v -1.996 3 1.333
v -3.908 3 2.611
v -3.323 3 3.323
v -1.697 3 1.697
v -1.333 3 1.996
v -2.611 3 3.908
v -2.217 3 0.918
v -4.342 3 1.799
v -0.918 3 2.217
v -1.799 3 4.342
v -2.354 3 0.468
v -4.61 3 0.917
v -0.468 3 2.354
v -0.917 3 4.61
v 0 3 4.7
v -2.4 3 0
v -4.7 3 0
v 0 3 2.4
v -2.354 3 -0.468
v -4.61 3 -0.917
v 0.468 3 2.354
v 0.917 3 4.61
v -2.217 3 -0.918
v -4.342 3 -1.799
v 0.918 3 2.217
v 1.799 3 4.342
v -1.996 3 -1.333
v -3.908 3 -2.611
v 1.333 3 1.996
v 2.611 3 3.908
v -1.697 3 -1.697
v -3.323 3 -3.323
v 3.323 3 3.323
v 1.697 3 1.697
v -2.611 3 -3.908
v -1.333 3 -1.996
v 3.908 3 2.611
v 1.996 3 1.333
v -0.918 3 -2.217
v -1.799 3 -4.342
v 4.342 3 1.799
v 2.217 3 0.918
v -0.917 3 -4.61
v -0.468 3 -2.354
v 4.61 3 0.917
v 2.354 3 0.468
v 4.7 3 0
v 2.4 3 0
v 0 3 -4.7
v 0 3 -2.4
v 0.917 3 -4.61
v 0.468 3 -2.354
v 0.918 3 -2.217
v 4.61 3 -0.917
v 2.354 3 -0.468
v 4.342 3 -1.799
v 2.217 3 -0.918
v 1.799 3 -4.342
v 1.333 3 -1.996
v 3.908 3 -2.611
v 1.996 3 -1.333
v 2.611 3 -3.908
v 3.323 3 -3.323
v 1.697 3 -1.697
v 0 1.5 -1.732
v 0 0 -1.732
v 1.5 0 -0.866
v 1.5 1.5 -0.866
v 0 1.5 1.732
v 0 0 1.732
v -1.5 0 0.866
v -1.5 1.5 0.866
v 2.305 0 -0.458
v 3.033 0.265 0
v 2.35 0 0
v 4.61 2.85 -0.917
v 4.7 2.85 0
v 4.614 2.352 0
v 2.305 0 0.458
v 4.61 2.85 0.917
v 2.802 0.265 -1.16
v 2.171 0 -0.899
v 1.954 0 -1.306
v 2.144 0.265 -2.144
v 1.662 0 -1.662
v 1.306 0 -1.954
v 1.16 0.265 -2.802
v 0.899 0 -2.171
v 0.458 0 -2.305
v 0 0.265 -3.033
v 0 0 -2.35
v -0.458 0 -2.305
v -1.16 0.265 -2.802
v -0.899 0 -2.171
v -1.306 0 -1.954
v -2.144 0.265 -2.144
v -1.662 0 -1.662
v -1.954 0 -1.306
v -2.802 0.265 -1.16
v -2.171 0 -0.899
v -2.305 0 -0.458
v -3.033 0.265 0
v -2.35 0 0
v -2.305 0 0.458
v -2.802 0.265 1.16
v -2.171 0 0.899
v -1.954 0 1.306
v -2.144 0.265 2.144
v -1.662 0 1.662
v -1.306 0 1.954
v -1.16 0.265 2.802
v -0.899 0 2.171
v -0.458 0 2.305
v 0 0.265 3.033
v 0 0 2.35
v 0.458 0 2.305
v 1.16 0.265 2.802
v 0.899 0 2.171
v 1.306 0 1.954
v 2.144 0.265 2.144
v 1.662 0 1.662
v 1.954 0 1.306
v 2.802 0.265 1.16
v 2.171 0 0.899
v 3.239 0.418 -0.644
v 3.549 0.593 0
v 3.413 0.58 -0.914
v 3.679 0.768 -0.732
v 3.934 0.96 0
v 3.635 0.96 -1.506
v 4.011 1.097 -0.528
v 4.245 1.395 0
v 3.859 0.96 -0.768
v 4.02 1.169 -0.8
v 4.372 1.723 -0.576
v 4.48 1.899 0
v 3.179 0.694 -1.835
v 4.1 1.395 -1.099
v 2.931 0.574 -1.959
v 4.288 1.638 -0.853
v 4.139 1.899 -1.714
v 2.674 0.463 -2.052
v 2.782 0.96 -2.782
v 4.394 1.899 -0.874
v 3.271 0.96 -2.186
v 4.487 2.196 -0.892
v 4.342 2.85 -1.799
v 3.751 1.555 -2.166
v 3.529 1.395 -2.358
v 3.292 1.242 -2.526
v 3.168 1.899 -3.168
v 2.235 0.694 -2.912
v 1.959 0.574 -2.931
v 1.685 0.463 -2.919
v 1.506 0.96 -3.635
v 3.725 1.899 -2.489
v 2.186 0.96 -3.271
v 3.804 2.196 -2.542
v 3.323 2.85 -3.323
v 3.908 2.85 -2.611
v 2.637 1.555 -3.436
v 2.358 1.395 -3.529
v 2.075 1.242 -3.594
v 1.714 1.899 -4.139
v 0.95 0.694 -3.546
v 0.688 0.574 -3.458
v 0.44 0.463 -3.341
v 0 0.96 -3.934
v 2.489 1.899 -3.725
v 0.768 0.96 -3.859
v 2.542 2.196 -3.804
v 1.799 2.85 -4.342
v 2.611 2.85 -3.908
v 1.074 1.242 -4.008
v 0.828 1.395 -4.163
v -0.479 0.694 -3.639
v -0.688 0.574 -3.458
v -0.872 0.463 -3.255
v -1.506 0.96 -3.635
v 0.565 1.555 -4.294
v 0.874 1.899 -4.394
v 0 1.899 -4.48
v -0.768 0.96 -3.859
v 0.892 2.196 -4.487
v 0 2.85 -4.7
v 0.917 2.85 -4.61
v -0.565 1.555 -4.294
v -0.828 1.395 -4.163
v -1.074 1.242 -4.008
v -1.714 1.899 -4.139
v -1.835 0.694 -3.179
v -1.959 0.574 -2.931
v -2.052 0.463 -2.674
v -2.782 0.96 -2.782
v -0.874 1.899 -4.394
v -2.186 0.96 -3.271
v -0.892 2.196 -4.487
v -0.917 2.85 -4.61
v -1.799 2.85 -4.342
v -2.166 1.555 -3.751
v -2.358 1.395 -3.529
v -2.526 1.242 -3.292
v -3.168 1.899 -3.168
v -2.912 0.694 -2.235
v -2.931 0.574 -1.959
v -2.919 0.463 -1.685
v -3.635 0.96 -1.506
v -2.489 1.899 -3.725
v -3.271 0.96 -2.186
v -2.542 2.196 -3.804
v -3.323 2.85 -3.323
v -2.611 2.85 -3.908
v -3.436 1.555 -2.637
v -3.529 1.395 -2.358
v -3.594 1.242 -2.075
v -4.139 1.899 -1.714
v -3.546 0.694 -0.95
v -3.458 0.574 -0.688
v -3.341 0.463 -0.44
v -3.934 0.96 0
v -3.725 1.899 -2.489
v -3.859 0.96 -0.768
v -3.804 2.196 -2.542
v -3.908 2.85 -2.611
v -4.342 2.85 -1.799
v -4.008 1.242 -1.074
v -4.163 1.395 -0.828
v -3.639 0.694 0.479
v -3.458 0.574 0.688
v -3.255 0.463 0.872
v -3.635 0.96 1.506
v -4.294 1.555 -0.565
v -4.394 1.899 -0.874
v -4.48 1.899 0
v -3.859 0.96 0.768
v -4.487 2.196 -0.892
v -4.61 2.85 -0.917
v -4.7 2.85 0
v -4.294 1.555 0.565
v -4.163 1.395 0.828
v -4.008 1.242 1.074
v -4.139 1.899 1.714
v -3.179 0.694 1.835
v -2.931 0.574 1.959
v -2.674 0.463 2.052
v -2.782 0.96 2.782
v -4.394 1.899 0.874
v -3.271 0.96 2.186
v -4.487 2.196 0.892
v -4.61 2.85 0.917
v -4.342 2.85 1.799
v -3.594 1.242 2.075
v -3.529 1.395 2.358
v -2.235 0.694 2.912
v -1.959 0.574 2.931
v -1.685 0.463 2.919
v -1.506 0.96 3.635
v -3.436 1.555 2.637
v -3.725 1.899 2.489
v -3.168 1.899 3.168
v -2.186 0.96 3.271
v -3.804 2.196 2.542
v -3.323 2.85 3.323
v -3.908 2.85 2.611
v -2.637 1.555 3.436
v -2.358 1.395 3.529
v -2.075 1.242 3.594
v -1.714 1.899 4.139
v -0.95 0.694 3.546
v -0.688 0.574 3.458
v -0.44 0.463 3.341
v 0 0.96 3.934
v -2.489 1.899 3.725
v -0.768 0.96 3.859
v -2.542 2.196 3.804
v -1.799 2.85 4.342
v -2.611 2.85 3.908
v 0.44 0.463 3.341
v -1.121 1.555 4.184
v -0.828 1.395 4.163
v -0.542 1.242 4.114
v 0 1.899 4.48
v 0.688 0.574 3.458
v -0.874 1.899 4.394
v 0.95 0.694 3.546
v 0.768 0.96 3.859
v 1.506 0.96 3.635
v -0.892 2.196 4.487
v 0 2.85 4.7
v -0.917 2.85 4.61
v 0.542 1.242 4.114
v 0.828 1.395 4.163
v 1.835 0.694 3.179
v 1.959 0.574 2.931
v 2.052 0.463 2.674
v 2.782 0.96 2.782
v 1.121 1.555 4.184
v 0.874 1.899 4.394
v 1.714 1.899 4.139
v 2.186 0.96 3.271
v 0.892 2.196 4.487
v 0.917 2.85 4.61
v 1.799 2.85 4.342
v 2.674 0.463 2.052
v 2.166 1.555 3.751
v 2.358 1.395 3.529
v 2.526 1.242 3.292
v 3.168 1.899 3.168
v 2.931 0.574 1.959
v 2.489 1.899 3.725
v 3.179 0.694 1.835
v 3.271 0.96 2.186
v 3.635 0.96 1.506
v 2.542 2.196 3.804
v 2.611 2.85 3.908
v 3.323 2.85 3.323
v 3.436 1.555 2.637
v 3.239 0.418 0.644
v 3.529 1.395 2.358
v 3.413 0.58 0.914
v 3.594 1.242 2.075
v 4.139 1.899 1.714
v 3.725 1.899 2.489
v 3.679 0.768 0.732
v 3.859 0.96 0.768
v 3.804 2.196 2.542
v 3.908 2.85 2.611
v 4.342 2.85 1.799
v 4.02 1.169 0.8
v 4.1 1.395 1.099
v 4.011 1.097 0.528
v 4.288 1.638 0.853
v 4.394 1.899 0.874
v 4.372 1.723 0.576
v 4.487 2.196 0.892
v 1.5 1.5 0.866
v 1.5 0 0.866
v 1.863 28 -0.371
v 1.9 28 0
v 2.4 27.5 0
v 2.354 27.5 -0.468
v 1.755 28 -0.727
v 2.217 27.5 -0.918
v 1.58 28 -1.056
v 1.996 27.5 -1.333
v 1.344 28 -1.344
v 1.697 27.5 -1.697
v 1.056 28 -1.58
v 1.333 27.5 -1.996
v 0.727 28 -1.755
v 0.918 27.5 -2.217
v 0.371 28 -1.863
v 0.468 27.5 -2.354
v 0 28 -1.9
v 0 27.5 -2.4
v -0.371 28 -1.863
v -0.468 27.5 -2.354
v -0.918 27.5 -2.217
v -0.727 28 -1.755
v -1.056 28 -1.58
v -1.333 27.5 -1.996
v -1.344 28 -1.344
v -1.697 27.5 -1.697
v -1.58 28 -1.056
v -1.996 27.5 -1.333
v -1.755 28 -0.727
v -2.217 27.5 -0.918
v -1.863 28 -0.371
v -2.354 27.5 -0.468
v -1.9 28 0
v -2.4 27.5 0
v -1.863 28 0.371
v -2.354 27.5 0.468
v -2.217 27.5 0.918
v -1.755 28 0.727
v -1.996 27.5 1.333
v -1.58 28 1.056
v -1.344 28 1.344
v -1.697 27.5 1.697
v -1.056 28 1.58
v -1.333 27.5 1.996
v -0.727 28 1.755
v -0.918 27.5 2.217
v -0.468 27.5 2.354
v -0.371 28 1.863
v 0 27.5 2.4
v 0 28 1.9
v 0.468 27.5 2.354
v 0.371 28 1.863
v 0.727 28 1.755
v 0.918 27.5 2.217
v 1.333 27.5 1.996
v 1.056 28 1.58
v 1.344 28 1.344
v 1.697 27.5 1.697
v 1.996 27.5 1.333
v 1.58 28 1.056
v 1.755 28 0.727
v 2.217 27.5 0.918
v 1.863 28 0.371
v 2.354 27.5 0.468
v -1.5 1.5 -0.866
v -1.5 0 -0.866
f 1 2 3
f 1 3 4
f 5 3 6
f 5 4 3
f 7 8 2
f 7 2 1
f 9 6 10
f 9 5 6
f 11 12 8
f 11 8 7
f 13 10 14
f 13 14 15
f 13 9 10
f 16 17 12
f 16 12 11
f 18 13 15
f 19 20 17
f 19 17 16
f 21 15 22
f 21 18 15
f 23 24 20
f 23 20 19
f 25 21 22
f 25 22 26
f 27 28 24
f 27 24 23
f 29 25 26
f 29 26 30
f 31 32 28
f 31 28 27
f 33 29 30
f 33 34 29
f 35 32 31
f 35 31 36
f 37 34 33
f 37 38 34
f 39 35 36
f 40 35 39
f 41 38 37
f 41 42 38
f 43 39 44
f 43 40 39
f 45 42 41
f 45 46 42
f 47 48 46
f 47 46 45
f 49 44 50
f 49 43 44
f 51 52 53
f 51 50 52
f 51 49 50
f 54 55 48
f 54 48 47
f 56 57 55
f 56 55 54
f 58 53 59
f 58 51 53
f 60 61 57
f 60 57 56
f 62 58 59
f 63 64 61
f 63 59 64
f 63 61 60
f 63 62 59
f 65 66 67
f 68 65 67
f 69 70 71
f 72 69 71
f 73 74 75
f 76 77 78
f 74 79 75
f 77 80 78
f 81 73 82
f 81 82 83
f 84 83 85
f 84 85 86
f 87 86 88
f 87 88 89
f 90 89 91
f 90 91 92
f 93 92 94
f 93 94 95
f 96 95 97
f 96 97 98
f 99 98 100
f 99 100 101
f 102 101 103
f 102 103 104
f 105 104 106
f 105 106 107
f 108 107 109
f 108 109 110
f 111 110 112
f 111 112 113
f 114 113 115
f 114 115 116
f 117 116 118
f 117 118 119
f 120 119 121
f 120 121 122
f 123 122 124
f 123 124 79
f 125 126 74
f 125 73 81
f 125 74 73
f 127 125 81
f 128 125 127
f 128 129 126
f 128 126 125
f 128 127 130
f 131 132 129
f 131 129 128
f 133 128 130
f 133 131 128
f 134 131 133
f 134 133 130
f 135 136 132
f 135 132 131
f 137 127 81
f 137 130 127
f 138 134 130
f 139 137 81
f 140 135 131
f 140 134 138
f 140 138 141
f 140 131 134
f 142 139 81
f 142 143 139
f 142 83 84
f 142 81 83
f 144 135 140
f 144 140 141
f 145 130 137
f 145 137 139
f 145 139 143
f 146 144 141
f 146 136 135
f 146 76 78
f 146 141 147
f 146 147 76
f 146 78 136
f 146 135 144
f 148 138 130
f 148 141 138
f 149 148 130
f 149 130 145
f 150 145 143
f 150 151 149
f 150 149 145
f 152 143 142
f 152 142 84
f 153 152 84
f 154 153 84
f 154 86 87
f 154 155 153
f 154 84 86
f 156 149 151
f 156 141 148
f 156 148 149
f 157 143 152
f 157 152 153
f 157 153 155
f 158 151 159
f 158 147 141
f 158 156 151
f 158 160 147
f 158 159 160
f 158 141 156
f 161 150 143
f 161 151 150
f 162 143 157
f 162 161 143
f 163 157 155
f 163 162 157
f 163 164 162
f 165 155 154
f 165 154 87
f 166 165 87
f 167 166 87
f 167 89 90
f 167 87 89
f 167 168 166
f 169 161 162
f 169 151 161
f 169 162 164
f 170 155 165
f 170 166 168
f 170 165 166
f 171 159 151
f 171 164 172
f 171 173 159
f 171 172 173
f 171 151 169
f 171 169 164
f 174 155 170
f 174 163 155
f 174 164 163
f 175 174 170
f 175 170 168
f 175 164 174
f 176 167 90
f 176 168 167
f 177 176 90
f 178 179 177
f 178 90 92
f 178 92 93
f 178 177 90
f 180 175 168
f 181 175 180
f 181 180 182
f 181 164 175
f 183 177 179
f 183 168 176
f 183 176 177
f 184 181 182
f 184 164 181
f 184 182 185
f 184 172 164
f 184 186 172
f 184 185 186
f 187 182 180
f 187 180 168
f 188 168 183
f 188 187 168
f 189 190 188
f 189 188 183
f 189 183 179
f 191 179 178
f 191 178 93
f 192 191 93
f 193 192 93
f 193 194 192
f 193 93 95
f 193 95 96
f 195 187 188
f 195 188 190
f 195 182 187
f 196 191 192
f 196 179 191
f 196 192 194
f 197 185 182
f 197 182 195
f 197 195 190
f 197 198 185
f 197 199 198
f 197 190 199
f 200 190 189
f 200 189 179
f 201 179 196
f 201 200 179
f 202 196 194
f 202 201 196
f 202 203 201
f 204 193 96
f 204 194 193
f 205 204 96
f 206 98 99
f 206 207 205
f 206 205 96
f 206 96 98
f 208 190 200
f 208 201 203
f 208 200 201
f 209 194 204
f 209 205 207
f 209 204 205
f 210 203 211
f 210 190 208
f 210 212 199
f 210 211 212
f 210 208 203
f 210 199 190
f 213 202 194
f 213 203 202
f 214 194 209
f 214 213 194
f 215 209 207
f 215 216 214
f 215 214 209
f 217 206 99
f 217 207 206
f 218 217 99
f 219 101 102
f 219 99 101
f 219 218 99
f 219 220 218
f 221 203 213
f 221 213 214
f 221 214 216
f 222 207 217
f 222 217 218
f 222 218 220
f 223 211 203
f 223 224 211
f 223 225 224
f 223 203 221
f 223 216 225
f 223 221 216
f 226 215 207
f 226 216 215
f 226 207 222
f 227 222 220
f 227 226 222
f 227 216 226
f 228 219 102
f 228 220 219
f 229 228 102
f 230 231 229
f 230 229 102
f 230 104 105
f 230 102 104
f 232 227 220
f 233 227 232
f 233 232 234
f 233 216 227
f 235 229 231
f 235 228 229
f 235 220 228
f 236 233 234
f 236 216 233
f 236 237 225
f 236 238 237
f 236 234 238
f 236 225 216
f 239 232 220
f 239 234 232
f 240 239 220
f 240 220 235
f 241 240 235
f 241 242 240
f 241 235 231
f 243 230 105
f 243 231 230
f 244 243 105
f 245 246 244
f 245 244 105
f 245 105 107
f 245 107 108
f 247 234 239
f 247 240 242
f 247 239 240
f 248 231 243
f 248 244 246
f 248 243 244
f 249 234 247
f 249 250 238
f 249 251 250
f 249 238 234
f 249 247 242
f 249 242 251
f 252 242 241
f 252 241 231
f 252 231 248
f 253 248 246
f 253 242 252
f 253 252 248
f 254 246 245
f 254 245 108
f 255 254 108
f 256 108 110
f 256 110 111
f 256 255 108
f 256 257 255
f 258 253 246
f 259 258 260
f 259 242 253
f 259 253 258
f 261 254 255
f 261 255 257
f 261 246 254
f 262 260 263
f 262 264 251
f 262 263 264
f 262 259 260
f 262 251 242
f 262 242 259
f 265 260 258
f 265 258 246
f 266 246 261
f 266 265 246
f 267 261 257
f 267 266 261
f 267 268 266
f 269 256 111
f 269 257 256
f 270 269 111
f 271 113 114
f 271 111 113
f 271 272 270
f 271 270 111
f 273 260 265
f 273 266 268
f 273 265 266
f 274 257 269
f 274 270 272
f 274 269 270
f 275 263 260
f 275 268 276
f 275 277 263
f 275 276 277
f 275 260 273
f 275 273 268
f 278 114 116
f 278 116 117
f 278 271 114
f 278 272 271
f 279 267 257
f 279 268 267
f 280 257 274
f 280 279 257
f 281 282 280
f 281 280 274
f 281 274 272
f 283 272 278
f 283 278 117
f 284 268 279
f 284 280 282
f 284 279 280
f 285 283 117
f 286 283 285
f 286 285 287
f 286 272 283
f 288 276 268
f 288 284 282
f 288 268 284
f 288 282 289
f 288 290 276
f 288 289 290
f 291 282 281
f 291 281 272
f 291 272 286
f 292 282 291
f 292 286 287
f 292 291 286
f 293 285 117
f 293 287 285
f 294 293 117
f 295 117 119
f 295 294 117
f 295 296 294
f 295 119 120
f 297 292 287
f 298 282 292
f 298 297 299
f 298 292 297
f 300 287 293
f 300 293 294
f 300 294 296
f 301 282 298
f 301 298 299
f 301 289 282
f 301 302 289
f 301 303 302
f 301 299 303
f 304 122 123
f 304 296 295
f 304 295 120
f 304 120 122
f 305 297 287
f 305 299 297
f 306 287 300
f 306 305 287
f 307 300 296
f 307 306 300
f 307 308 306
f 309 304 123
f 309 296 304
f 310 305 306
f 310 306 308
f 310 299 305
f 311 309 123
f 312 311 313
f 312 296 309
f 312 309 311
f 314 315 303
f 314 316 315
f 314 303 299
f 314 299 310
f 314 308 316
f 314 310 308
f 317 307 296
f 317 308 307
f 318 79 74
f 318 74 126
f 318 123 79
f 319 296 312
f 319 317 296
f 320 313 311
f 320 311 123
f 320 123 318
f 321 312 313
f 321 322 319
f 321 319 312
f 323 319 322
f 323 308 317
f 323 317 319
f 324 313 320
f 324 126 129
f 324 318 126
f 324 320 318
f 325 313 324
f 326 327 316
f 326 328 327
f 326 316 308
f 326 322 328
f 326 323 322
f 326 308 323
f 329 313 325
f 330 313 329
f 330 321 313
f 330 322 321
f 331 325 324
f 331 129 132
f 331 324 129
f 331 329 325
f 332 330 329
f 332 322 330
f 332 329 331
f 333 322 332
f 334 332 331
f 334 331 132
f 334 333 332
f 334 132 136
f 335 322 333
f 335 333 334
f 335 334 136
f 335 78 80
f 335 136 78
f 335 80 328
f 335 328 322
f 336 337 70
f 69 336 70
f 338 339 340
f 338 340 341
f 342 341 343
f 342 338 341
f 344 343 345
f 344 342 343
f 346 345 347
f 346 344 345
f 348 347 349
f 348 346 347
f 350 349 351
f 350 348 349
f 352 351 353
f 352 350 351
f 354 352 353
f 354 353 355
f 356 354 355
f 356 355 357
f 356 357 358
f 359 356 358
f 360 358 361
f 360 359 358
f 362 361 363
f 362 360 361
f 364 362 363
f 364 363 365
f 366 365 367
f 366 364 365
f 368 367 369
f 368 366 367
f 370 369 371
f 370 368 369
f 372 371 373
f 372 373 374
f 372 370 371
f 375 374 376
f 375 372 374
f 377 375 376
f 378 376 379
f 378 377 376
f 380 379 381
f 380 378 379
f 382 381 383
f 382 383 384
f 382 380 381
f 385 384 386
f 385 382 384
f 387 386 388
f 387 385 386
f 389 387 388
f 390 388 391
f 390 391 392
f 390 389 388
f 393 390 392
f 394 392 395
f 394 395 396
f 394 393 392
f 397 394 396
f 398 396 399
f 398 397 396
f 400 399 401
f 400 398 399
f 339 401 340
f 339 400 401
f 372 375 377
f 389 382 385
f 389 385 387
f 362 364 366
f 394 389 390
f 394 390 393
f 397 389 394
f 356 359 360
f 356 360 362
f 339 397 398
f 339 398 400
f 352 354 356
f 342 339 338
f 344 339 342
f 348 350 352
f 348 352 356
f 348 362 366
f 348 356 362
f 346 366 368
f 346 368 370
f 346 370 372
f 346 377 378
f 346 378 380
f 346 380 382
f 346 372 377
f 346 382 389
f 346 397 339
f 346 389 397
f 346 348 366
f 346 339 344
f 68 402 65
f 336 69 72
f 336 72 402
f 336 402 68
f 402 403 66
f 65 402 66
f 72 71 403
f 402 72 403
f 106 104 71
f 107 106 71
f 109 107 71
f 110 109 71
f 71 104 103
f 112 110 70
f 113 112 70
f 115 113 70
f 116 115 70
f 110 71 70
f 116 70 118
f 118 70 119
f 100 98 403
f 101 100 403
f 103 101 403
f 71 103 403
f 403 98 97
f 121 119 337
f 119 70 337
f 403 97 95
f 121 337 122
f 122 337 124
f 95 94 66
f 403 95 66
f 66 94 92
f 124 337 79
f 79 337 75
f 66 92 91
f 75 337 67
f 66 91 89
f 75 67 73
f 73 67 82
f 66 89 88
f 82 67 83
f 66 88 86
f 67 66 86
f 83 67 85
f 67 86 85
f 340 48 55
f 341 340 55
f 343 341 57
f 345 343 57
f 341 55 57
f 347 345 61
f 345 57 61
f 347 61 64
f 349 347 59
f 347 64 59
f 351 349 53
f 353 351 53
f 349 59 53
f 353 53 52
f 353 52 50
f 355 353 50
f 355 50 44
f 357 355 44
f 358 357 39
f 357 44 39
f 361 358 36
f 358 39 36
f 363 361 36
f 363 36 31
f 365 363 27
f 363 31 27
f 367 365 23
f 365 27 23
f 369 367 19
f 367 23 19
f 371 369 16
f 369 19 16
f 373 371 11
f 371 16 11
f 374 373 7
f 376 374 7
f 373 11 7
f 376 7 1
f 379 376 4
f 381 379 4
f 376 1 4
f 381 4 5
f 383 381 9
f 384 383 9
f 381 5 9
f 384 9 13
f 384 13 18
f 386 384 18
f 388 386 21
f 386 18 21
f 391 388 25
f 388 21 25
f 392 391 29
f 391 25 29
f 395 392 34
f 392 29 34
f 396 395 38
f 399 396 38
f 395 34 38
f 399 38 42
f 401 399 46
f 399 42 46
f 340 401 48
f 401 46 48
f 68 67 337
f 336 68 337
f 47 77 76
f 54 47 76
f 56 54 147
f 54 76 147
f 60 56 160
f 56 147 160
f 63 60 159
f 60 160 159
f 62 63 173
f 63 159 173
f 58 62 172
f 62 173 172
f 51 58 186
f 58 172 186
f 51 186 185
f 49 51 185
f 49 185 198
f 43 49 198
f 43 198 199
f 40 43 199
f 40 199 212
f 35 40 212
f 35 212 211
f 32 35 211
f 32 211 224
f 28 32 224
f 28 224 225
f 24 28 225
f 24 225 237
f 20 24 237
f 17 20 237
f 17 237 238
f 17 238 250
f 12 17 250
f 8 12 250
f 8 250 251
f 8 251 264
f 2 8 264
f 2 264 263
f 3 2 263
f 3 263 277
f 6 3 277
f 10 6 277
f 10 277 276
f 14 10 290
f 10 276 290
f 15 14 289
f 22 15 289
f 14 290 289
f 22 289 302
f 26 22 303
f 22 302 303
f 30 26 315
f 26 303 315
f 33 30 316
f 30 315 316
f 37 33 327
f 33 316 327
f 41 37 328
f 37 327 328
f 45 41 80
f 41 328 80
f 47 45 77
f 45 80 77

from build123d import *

# Parameters (mm, degrees)
SKETCH1_R           = 4.7
BOSS_EXTRUDE1_DEPTH = 3
SKETCH2_R           = 2.4
BOSS_EXTRUDE2_DEPTH = 25
CUT_EXTRUDE1_DEPTH  = 1.5
CHAMFER1_SIZE       = 0.5


with BuildPart() as part:
    # Sketch1 → Boss-Extrude1 (new body)
    with BuildSketch(Plane(origin=(0, 0, 0), x_dir=(1, 0, 0), z_dir=(0, 1, 0))):
        Circle(SKETCH1_R)
    extrude(amount=BOSS_EXTRUDE1_DEPTH)

    # Sketch2 → Boss-Extrude2 (add)
    with BuildSketch(Plane(origin=(0, 3, 0), x_dir=(1, 0, 0), z_dir=(0, 1, 0))):
        Circle(SKETCH2_R)
    extrude(amount=BOSS_EXTRUDE2_DEPTH)

    # Sketch3 → Cut-Revolve1 (revolve, cut)
    with BuildSketch(Plane.XY):
        with BuildLine():
            Line((2.35, 0), (4.7, 0))
            Line((4.7, 0), (4.7, 2.85))
            add(Edge.make_bspline(
                [(2.35, 0), (4.432462228, 0.599611143), (4.7, 2.85)],
                knots=[0, 0, 0, 1, 1, 1], degree=2))
        make_face()
    revolve(axis=Axis((0, 0, 0), (0, 1, 0)), mode=Mode.SUBTRACT)

    # Sketch4 → Cut-Extrude1 (cut)
    with BuildSketch(Plane.XZ):
        Polygon((0, 1.732050808), (-1.5, 0.866025404), (-1.5, -0.866025404), (0, -1.732050808), (1.5, -0.866025404), (1.5, 0.866025404), align=None)
    extrude(amount=-CUT_EXTRUDE1_DEPTH, mode=Mode.SUBTRACT)

    # Chamfer1
    chamfer1_edges = [part.edges().sort_by_distance(p)[0] for p in [
        (-2.4, 28, 0),
    ]]
    chamfer(chamfer1_edges, length=CHAMFER1_SIZE)


solid = part.part
